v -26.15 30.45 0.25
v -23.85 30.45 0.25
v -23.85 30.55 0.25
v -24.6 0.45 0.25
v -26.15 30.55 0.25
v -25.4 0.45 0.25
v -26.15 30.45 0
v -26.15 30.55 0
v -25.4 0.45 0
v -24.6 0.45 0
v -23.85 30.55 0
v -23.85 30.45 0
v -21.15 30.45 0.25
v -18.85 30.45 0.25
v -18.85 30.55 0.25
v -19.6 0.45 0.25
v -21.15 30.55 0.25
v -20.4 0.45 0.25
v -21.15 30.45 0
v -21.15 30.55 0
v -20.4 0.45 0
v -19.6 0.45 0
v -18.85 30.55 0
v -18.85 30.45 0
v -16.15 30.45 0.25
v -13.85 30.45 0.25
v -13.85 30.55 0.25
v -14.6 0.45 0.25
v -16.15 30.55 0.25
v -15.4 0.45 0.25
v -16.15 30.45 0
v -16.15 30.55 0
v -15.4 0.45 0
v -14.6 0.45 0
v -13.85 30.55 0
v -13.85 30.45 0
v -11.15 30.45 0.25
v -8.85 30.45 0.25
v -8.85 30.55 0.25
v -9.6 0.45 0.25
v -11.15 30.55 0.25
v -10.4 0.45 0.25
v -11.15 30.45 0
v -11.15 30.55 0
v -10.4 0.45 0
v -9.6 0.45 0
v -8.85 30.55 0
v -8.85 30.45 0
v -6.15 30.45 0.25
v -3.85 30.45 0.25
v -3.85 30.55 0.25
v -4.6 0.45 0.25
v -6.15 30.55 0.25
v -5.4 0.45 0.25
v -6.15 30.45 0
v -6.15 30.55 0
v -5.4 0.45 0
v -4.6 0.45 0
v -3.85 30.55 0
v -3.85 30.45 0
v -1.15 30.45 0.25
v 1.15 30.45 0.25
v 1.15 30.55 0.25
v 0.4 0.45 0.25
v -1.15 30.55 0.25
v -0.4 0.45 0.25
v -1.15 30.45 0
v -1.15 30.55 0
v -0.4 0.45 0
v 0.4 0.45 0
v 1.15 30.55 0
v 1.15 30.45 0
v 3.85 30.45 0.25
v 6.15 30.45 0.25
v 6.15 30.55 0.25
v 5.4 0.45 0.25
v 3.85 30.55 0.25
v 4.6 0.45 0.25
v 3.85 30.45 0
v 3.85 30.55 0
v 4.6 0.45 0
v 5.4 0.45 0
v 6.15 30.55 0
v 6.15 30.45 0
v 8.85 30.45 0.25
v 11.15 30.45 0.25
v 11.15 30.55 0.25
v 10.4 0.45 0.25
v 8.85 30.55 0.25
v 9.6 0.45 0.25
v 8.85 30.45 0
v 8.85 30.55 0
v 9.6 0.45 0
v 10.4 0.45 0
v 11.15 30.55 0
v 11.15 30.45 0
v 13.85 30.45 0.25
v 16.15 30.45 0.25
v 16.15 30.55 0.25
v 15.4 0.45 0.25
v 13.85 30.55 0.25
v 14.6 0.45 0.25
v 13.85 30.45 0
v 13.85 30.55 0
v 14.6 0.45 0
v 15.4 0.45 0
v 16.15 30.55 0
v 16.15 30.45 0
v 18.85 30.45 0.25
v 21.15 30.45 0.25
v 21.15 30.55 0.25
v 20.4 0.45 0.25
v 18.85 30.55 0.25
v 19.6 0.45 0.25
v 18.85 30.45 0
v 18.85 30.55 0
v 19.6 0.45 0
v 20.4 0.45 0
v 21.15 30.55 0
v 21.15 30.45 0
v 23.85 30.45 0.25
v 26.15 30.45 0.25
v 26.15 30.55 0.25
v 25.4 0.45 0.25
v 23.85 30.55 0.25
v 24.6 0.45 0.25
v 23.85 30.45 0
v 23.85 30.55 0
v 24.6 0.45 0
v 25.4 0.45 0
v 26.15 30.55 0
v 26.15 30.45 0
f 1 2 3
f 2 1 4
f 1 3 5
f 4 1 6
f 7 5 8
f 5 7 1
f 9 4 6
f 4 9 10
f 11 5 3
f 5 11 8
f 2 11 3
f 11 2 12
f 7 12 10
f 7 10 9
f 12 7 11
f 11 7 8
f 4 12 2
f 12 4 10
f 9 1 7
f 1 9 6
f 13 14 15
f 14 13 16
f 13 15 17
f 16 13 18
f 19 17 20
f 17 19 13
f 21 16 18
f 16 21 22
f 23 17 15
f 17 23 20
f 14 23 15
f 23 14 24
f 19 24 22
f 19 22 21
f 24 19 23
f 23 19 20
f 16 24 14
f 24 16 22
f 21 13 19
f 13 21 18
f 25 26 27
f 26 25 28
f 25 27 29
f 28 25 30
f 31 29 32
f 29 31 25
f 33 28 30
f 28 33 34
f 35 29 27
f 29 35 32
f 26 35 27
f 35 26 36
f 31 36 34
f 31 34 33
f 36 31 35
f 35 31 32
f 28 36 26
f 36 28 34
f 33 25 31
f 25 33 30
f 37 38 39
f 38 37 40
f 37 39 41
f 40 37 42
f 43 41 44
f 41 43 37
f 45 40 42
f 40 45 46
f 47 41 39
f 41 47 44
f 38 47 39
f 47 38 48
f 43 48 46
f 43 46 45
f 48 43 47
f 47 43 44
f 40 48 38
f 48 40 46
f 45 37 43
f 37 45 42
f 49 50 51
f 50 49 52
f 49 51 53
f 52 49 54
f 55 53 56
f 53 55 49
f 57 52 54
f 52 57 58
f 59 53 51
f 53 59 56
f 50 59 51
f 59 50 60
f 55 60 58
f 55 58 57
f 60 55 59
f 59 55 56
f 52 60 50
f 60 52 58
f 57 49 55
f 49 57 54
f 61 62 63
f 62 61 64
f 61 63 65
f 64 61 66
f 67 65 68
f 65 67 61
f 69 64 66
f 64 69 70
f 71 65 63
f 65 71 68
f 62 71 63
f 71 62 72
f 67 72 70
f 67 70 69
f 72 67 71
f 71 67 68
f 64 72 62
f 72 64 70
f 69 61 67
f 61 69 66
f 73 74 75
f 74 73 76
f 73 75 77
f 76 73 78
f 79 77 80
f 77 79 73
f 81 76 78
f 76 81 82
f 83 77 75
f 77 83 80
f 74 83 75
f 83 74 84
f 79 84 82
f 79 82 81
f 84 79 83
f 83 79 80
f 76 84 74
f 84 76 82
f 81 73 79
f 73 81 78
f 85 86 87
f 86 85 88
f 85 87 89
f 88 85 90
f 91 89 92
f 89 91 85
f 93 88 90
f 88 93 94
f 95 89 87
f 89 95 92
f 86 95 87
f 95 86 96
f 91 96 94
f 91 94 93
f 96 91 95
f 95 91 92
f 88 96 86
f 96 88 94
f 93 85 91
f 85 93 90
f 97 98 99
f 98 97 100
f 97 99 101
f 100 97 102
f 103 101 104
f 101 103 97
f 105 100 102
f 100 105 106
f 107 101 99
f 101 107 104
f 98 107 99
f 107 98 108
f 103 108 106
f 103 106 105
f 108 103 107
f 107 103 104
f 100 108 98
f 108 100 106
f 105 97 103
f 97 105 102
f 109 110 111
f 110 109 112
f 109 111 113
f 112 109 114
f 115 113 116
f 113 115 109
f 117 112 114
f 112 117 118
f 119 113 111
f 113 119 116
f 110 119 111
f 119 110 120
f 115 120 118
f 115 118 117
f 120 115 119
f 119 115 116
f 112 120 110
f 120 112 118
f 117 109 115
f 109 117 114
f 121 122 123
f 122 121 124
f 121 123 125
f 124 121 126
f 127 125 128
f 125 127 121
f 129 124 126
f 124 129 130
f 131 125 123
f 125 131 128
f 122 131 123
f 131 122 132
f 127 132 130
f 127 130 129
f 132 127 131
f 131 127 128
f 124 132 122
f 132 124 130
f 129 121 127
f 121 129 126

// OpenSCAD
// dusatest4.scad
// This is copied from https://github.com/T3P3/BigBox_Mods/blob/master/calibration%20objects/IDEX_Calibration.scad
// It should make some lines that act like a vernier for X and Y offset adjustment

/*
Calibration print for tool offsets for an Dual Independent X axis (IDEX) printer such as the experimental BigBox Idex:
https://forum.e3d-online.com/index.php?threads/bigbox-dual-x-carriages.2184/
This use this to generate two seperate STL files, I with regular spaced lines on X and Y
1 with varyingly spaced lines.
Selecting which lines on X and Y most closely match will alow you to determine the tool offset accurately.
e.g.
3 lines spaced 10 mm apart, located with 3 lines centered at the middle and spaced at 9.5 and 10.5 either side. If the 10.5 line is lined up the the second head is 0.5-, if the 9.5 line lines up it is 0.5+ of the center line. For best results extend the number of lines and reduce the size of the spacing.
You may need a course and fine test, 1 to get within 0.5mm and one to get <0.05mm
*/

numLines = 11; //number of calibration lines must be an odd number
lineSpacing = 5; //line spacing in mm for the regular lines
variation = 0.1; // step for varying lines
lineHeight = 0.25; //set to your calibration layer height.
lineWidth = 0.8; //set to the first layer line width your slicer generates
lineLength = 30;  //the length of the printed lines
gap=1;


module regularGrid() {
    for(i=[-((numLines-1)/2) : 1 : ((numLines-1)/2)]){
        translate([i*lineSpacing ,gap/2,lineHeight/2])
        color("black") 
        hull() {
            cube([lineWidth,0.1,lineHeight],center=true);
            translate([0,lineLength,0])
                cube([lineSpacing/2-0.2,0.1,lineHeight],center=true);
        }
    }
    
}

module varyingGrid() {
    for(i=[-((numLines-1)/2): 1 : ((numLines-1)/2)]){
        translate([i*lineSpacing-variation*i,-gap/2,lineHeight/2])
        color("red")
        hull(){
            cube([lineWidth,0.1,lineHeight],center=true);
            translate([0,-lineLength,0])
                cube([lineSpacing/2-0.2,0.1,lineHeight],center=true);
        }
    }
    
}

//create STLs for regular and varying grid seperately anc combine them in your slicer
regularGrid();
//varyingGrid();
